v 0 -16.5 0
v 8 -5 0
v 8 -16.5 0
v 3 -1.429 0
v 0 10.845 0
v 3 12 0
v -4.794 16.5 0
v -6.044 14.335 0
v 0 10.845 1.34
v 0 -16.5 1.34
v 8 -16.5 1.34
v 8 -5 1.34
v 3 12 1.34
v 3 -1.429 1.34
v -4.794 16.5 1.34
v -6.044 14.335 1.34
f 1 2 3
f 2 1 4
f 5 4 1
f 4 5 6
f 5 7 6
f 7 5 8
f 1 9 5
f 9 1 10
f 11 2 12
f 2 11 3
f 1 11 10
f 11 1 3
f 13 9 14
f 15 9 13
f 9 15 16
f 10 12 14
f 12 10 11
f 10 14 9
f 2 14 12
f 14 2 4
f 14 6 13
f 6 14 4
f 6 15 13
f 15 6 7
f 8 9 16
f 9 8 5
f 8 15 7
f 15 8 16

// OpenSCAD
//
// RU9 family ejector
//

// The 1.34mm thick plate comes from a local hardware store.
// Closest American plates are:
//    16 Gauge = 1.588 mm
//    17 Gauge = 1.429 mm
//    18 Gauge = 1.270 mm
// 
thickness = 1.34;

module nose () {
    translate([3.0, 12.0, 0]) {
        rotate(60, [0,0,1]) {
            // Rotating around the zero corner helps to translate it around
            // precisely later, so move it where we want to rotate.
            translate([-2.5, 0, 0]) {
                cube([2.5, 9.0, thickness]);
            }
        }
    }
}

module stem () {
    translate([0, -3.0, 0])
        cube([3.0, 15.0, thickness]);
}

module root () {
    hull () {
        translate([0.0, -1.0, 0])
        cube([1.0, 1.0, thickness]);
        translate([0.0, (11.5+5.0)*-1, 0])
            cube([8.0, 11.5, thickness]);
    }
}

module main () {
    root();
    stem();
    nose();
}

main();
